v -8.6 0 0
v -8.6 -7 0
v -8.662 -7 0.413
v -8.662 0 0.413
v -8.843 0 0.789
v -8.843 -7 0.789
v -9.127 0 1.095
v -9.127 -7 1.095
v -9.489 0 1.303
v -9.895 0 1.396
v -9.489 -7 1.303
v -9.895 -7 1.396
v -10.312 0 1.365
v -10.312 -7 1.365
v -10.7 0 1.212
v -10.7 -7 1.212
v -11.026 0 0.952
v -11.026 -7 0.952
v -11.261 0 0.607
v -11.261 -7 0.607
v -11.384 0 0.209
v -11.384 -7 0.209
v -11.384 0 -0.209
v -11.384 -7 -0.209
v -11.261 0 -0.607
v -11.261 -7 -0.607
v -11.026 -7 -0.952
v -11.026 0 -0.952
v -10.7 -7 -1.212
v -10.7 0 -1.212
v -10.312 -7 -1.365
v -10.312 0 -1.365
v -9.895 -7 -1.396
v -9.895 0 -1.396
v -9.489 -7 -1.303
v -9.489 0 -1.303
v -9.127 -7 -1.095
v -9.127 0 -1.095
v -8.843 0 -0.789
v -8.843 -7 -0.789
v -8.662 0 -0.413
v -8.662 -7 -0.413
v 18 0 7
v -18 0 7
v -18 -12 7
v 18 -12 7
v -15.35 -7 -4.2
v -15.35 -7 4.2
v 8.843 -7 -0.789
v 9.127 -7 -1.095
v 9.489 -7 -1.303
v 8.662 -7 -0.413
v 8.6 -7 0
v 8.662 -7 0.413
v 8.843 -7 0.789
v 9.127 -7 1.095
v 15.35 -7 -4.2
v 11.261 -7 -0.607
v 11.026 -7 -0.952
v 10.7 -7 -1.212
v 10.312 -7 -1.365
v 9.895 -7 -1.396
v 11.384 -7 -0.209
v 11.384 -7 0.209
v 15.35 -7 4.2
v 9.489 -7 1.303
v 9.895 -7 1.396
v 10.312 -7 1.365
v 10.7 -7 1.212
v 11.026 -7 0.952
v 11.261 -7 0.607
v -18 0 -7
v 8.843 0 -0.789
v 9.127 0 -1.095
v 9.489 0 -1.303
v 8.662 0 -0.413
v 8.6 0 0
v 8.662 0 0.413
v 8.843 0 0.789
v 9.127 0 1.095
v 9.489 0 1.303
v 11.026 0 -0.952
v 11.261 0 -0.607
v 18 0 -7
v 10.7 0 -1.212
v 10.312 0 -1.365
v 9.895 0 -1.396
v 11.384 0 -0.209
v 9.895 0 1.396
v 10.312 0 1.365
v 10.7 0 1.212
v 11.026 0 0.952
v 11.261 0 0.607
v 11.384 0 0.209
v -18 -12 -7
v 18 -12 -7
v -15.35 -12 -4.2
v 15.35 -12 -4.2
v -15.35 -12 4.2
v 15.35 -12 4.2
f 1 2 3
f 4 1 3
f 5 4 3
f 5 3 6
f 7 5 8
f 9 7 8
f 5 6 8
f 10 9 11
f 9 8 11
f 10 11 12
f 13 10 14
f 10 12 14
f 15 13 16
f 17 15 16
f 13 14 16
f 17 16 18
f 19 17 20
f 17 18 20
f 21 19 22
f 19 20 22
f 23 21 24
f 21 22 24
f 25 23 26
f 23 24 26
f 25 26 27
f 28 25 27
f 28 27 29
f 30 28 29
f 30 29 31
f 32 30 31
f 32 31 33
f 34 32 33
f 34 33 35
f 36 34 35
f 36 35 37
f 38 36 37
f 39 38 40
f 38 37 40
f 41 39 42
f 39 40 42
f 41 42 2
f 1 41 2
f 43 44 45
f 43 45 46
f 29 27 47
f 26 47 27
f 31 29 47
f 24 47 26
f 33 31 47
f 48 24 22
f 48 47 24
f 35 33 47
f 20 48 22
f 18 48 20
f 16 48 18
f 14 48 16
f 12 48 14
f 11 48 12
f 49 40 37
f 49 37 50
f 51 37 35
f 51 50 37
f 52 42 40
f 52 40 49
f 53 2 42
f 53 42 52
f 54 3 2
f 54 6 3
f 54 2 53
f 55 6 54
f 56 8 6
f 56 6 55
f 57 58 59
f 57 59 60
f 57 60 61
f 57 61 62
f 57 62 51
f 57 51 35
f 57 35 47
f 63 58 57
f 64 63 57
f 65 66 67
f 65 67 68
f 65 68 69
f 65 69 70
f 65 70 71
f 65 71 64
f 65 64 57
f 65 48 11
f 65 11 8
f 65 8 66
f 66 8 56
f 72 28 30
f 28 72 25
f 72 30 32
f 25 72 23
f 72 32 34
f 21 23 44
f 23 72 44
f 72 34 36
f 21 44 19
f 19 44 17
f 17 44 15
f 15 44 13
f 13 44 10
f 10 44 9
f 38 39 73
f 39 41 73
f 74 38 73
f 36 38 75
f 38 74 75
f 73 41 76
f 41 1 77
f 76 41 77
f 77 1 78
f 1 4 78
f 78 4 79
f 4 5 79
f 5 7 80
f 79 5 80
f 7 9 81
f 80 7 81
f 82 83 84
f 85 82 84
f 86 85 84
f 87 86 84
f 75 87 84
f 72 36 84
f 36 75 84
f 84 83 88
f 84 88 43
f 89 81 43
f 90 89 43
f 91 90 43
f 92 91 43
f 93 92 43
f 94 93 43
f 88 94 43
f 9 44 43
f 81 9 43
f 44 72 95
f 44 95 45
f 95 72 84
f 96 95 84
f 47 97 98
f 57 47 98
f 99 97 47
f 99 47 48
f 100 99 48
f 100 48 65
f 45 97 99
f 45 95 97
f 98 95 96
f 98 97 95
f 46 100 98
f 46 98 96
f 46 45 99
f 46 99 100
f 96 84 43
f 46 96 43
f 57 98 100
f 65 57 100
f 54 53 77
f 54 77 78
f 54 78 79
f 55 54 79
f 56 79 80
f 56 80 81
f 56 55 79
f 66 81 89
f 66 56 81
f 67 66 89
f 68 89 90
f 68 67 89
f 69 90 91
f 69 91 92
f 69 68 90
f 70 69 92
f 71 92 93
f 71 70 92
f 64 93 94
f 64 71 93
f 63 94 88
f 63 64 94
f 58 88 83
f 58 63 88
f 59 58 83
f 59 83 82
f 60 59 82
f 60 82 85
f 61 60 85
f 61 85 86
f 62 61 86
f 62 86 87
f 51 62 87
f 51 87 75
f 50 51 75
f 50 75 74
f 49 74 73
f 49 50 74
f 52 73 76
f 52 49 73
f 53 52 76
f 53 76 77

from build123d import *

# Parameters (mm, degrees)
F0_W     = 36
F0_H     = 14
F1_DEPTH = 12
F2_W     = 30.7
F2_H     = 8.4
F3_DEPTH = 5
F4_R     = 1.4
F5_DEPTH = 7


# Not quite as in the source:
# - a pattern or mirror of a feature is missing from the dataset's text; its kind, count and spacing are read off the source's solid


with BuildPart() as f1:
    # F0 (on Front) → F1 (new body)
    with BuildSketch(Plane.XZ):
        Rectangle(F0_W, F0_H)
    extrude(amount=F1_DEPTH)

    # F2 (on face) → F3 (cut)
    with BuildSketch(Plane.XZ.offset(12)):
        Rectangle(F2_W, F2_H)
    extrude(amount=-F3_DEPTH, mode=Mode.SUBTRACT)

    # F4 (on face) → F5 (cut, through all)
    with BuildSketch(Plane.XZ.offset(7)):
        with Locations((-10, 0)):
            Circle(F4_R)
    f5 = extrude(amount=-F5_DEPTH, mode=Mode.SUBTRACT)

    # F5_copies: F5 across plane
    add(f5.mirror(Plane(origin=(0, 0, 0), x_dir=(0, 0, 1), z_dir=(1, 0, 0))), mode=Mode.SUBTRACT)


solid = f1.part
